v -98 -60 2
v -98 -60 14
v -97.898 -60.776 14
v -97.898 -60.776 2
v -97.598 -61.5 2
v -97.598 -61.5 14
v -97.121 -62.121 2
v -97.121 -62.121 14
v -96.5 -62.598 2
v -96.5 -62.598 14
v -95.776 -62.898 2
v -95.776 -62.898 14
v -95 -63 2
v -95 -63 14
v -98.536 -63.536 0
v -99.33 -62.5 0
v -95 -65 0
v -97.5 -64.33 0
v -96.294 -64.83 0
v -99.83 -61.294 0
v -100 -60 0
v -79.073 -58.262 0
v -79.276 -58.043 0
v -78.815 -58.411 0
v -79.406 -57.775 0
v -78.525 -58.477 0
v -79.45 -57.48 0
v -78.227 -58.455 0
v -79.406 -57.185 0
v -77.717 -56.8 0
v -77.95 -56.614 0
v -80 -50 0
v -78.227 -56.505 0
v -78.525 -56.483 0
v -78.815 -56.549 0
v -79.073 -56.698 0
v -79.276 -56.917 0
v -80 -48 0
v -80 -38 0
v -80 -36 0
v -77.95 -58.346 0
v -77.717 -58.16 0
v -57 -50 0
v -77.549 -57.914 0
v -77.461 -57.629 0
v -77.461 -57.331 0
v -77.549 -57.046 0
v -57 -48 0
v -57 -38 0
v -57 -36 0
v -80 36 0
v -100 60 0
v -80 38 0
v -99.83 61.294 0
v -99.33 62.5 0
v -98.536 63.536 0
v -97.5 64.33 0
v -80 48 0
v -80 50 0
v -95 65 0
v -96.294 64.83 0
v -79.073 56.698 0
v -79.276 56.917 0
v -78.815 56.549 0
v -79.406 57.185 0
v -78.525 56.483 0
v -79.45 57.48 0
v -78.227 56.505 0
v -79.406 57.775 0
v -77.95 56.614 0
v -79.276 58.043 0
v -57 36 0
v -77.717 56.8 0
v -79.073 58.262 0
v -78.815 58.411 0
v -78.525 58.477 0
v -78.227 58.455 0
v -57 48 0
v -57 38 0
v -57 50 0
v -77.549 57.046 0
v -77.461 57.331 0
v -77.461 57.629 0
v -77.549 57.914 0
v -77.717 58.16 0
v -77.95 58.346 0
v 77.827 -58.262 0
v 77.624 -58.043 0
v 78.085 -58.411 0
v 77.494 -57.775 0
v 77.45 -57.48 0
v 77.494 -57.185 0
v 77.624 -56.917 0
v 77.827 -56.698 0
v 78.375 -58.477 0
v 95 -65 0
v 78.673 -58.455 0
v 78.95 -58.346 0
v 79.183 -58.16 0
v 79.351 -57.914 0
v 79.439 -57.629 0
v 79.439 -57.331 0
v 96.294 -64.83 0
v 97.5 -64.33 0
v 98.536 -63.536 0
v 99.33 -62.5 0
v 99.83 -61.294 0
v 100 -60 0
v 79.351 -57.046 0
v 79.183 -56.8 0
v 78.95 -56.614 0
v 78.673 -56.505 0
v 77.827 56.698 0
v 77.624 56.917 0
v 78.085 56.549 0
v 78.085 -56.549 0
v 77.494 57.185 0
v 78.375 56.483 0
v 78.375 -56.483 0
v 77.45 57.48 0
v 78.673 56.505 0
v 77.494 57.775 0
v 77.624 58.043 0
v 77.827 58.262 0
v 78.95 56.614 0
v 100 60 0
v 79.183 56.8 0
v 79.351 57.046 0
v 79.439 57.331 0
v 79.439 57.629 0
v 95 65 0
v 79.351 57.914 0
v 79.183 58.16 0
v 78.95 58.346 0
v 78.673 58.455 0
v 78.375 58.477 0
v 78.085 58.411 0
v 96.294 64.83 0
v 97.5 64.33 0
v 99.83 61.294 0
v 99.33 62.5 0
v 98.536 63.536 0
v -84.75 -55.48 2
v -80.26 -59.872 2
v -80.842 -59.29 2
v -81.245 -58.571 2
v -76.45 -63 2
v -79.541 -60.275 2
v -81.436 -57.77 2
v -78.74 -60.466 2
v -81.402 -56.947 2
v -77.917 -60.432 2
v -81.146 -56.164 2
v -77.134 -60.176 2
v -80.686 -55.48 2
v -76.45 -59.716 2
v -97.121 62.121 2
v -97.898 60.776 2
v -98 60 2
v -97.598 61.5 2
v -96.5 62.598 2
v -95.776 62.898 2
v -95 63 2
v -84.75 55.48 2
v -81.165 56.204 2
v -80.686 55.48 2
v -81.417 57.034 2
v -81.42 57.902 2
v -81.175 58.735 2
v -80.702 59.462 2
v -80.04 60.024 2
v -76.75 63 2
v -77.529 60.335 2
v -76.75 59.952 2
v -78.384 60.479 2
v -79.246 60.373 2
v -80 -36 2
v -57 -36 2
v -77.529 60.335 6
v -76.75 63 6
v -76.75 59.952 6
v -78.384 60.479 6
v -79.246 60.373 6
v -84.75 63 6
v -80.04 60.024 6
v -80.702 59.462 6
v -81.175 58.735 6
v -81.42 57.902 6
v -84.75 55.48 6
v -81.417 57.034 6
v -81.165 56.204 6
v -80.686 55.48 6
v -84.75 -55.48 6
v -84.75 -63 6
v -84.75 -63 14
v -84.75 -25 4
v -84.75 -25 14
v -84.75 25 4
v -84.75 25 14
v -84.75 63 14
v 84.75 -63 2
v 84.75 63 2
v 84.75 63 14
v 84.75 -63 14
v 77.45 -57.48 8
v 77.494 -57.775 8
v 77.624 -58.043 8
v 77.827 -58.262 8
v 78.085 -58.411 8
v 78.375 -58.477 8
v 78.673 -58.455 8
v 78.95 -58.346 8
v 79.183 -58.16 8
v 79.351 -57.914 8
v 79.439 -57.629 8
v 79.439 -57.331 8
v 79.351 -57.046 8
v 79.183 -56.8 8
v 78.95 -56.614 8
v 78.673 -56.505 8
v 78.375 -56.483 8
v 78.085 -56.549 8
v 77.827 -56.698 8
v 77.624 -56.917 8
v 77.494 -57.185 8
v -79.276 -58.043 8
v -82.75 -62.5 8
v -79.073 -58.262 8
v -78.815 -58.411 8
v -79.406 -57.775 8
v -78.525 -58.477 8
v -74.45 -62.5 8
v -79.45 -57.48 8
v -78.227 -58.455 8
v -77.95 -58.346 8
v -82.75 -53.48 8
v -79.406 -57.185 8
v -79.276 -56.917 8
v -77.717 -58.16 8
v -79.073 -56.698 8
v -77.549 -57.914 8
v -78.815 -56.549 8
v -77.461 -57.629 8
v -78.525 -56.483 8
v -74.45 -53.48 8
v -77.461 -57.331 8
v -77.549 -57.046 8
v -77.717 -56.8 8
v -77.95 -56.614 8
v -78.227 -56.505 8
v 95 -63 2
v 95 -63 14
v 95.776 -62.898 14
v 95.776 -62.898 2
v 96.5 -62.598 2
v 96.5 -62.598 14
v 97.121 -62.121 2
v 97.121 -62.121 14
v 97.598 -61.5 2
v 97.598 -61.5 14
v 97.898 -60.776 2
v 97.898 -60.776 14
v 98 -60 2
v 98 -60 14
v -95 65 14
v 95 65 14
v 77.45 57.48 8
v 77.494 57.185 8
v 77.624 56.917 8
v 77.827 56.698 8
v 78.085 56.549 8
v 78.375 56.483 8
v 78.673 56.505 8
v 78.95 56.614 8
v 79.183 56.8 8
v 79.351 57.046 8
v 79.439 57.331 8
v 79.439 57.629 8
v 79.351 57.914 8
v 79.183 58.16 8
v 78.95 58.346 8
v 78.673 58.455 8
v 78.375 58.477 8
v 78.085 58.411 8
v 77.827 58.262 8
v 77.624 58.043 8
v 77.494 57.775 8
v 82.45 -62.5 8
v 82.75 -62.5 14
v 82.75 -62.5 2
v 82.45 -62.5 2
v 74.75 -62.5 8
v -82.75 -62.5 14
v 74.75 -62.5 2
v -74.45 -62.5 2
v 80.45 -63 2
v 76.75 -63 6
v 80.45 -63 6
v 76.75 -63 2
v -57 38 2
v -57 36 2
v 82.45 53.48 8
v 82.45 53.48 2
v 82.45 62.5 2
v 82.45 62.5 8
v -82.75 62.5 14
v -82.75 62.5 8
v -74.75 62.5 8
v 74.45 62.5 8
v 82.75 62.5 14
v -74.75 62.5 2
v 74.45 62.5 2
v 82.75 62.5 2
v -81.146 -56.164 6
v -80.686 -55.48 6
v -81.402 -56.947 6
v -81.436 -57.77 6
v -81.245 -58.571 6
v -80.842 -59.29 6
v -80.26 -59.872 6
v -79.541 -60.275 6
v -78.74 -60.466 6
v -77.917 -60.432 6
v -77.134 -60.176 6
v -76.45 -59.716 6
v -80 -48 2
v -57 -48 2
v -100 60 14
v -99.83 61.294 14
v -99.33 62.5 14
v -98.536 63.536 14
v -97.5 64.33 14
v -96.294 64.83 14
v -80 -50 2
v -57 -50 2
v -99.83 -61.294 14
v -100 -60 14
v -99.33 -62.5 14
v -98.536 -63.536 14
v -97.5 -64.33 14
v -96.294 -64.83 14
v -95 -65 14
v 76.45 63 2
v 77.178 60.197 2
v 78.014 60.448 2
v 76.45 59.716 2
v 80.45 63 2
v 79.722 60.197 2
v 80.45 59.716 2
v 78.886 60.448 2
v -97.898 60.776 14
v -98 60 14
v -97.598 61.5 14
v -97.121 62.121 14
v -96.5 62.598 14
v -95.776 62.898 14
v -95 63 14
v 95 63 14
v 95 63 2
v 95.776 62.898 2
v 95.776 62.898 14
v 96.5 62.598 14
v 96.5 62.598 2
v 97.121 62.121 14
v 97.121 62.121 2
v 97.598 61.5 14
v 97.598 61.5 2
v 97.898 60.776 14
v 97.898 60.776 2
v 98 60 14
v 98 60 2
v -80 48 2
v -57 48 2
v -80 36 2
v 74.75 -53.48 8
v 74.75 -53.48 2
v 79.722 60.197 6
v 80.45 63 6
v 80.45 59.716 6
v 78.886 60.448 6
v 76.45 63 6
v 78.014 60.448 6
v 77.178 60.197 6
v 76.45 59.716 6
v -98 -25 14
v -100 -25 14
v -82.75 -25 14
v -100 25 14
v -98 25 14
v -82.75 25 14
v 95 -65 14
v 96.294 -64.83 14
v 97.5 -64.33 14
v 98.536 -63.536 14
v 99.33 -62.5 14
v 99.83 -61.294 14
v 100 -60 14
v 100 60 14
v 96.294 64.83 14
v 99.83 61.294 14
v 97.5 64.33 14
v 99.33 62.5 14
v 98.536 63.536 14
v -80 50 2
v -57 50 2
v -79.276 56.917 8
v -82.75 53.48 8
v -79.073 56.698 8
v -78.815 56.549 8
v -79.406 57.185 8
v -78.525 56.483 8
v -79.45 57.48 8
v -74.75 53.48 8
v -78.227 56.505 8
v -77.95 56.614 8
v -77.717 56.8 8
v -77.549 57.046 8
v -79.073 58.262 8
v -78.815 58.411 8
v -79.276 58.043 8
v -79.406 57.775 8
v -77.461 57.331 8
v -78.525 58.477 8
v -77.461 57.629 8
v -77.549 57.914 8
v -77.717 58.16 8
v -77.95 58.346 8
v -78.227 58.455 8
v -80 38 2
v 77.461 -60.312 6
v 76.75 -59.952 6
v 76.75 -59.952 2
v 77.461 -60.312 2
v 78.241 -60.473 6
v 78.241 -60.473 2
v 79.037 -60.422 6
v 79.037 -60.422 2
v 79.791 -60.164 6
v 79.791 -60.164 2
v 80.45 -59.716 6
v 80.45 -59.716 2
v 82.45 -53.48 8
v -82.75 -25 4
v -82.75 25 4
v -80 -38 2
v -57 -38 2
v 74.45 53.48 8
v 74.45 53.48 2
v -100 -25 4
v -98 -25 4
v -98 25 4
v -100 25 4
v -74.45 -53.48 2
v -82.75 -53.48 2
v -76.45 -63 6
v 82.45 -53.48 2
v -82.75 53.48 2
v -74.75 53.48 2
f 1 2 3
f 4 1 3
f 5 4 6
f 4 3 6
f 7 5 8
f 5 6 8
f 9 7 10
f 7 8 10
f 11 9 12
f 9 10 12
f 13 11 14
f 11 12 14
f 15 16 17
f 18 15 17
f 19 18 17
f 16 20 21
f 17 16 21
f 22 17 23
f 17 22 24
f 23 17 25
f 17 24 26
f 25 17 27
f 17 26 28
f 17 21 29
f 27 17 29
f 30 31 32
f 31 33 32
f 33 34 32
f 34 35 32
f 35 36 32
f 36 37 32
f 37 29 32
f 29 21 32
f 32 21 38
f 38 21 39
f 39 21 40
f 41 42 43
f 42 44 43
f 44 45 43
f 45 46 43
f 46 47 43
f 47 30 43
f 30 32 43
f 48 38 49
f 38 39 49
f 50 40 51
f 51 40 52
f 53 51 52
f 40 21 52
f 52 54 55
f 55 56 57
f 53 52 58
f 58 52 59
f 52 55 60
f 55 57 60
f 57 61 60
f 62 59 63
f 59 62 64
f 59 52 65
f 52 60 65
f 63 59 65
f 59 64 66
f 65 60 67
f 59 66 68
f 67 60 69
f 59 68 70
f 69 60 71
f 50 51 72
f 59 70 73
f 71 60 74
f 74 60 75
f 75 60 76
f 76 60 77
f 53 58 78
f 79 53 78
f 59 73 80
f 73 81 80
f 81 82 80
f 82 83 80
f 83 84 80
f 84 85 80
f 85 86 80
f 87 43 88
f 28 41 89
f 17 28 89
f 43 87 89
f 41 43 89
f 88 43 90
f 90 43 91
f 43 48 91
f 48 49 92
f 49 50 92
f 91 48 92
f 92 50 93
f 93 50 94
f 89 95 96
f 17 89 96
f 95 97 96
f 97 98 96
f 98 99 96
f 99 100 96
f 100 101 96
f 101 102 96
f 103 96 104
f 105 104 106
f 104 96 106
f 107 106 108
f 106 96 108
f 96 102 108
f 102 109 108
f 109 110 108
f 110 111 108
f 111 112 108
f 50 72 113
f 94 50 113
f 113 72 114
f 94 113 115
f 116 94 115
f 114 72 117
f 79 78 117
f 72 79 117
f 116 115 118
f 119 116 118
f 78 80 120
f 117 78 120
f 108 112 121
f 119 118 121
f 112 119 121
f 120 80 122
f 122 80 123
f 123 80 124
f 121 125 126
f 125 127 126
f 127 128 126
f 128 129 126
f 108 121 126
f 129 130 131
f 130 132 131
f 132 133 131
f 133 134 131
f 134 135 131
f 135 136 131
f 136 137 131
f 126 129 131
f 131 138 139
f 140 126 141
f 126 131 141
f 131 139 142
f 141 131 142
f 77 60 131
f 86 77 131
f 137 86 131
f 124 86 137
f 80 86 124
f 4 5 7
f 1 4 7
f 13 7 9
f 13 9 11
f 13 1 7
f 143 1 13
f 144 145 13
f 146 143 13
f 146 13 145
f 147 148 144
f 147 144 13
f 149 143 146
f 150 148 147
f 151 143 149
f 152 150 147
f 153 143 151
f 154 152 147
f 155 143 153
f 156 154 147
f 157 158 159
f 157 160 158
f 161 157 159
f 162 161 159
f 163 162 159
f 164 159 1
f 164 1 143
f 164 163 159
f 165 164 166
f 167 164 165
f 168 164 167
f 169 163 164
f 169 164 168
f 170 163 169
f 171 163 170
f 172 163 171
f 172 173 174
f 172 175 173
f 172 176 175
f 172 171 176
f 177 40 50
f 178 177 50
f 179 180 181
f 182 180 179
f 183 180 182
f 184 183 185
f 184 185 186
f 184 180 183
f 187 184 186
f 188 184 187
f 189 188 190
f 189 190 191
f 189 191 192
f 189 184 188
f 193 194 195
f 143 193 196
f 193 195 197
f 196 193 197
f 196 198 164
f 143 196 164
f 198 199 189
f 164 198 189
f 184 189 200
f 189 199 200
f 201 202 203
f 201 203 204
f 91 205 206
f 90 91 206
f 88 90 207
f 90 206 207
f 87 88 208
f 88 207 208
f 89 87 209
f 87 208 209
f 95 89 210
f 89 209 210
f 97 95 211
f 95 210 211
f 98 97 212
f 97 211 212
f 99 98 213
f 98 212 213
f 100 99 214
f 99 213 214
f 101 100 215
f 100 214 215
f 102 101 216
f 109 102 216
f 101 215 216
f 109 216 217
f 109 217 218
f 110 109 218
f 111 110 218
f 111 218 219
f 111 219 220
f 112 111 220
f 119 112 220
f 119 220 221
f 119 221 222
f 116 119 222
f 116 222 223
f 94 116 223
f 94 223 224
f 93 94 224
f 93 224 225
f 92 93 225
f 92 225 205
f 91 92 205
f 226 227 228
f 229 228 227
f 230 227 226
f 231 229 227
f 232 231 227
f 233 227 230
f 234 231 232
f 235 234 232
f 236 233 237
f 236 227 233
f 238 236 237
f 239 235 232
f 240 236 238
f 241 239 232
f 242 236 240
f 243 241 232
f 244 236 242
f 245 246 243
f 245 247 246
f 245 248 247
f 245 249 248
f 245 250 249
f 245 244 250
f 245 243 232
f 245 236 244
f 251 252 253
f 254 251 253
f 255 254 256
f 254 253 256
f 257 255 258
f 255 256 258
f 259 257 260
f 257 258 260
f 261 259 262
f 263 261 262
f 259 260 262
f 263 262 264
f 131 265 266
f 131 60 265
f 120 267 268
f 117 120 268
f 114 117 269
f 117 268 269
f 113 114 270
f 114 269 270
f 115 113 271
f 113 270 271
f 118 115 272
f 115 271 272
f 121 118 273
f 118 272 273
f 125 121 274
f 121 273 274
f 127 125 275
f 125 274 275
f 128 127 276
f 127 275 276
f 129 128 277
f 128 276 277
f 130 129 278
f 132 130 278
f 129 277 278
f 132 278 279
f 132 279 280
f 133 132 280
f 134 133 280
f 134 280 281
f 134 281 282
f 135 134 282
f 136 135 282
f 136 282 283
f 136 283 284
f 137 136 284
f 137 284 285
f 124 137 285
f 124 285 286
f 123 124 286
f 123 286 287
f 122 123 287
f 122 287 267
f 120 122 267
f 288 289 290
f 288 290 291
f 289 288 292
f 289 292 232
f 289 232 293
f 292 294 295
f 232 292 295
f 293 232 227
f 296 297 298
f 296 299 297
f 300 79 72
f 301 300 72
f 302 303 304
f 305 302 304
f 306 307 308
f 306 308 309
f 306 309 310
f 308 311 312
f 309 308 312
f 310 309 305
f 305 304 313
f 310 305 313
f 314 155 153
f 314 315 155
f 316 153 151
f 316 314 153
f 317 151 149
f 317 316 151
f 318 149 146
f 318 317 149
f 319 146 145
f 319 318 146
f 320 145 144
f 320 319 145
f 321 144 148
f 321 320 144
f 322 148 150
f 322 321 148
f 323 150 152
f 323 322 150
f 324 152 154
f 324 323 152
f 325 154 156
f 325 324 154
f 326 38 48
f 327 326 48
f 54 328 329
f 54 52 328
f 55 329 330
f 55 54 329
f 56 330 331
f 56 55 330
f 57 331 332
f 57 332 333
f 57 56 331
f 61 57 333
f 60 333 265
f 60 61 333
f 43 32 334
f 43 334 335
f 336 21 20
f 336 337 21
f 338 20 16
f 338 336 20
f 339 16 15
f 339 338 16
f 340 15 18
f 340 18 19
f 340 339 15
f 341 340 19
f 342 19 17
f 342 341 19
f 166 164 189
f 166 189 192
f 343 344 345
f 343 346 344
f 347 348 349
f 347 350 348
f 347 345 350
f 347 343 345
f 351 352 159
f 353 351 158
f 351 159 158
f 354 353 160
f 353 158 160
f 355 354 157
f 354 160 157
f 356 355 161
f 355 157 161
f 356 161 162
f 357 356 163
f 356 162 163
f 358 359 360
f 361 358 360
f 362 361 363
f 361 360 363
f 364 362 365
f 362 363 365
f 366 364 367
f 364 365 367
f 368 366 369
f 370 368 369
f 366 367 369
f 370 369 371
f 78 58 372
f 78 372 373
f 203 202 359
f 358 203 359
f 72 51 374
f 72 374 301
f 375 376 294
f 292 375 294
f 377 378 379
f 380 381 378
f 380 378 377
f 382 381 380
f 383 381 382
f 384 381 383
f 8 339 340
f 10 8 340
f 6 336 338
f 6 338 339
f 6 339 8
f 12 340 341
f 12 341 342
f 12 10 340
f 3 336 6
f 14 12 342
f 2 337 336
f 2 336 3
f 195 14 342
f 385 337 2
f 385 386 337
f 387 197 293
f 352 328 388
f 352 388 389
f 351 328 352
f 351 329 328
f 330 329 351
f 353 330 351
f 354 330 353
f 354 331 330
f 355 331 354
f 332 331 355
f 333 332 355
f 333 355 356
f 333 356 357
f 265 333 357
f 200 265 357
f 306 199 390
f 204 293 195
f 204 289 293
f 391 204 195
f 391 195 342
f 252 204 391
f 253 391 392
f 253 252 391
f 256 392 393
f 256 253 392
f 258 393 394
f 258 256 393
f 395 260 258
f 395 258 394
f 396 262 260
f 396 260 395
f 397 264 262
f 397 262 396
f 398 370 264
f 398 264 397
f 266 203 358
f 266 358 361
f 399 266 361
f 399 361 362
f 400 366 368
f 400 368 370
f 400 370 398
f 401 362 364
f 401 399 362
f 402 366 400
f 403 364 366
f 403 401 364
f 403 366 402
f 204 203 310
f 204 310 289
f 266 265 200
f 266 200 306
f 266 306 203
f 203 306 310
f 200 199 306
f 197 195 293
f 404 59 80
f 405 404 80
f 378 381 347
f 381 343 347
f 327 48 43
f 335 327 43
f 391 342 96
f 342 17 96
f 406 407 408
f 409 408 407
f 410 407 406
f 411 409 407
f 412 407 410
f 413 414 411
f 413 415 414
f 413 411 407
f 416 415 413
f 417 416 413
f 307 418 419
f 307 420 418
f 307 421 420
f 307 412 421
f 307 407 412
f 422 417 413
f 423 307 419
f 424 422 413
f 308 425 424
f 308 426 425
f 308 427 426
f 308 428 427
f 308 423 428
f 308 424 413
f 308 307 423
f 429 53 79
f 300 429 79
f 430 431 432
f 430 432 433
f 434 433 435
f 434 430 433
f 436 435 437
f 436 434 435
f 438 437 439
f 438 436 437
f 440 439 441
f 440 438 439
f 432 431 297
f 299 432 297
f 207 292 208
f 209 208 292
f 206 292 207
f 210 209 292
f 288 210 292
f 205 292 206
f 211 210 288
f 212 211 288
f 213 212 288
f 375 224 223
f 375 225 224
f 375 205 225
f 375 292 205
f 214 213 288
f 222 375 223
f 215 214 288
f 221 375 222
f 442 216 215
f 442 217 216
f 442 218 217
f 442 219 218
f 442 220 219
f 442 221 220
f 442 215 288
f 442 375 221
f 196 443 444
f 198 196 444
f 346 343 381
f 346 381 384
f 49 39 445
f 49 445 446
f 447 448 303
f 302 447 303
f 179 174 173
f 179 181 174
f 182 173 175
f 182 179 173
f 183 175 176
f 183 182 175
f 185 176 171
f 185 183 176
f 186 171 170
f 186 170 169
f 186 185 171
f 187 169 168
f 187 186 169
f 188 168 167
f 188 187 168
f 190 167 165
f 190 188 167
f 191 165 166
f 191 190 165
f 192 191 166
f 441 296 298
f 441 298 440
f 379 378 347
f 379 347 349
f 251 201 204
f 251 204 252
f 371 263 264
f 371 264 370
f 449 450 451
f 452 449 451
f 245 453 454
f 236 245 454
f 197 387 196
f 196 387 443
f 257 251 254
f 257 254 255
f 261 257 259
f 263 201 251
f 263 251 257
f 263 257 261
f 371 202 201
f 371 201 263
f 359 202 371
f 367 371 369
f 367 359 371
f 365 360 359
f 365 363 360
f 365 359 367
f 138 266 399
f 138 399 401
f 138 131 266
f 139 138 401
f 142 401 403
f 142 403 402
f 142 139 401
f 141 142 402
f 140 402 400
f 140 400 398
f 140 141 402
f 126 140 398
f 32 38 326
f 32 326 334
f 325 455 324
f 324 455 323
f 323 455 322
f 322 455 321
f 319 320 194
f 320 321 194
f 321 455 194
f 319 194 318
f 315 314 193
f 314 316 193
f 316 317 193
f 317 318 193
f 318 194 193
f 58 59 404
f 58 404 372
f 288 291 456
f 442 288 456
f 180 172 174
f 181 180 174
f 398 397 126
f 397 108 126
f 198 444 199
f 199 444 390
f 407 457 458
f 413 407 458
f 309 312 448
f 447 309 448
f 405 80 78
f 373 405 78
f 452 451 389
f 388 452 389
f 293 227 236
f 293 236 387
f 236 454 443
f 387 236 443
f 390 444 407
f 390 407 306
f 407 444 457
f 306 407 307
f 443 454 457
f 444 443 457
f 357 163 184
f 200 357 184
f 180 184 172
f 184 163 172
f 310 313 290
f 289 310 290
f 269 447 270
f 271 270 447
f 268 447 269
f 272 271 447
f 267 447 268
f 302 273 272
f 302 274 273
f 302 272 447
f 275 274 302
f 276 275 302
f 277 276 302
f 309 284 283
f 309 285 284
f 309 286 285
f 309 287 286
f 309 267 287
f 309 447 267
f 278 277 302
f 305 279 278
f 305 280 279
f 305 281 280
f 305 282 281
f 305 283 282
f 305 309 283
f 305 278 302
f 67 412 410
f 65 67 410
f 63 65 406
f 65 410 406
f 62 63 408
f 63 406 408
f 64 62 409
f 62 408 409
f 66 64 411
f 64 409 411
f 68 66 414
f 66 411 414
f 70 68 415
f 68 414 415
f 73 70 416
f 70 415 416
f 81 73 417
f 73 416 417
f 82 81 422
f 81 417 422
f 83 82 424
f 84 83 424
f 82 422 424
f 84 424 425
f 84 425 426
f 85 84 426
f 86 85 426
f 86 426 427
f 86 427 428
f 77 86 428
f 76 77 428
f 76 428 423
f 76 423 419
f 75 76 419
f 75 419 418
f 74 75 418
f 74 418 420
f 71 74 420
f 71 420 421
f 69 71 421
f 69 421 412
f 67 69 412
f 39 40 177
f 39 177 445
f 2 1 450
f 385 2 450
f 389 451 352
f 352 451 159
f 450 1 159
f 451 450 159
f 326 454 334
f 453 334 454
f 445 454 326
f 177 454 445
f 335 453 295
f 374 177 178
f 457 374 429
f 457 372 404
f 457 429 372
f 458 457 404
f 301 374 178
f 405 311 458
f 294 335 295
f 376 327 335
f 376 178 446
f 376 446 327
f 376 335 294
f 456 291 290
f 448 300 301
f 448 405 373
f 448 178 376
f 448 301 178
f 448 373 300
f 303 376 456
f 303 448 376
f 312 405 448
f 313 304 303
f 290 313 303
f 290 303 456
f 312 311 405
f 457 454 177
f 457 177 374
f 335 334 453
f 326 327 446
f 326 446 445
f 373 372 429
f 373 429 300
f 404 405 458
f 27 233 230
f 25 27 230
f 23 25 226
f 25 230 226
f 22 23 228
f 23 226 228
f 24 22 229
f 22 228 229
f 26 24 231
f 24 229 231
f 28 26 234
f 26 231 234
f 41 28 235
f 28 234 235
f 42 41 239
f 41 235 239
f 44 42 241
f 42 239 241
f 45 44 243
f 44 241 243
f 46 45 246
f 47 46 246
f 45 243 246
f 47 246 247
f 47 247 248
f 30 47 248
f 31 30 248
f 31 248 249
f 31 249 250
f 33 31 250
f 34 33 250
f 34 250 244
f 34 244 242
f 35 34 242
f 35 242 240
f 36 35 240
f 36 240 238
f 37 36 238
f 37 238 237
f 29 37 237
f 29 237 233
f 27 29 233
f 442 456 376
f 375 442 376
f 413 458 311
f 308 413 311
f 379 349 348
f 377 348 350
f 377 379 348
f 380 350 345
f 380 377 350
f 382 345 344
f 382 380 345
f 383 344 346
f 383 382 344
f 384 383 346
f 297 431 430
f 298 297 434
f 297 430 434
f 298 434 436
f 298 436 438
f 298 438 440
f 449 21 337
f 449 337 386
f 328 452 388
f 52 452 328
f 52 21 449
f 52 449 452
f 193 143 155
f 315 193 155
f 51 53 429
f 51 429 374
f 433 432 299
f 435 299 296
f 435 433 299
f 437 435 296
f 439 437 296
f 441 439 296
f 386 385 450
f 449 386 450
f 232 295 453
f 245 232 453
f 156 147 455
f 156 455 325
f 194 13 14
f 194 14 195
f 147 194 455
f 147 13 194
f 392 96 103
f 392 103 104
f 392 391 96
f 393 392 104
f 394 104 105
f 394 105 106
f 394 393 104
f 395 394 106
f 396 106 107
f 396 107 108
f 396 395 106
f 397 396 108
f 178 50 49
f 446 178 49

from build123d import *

# Parameters (mm, degrees)
F0_W         = 200
F0_H         = 130
F0_W_2       = 0.3
F0_H_2       = 106.96
F1_DEPTH     = 2
F2_DEPTH     = 14
F3_DEPTH     = 8
F4_D         = 2
F5_R         = 5
F6_T         = 2
F6_T3_DEPTH  = 16
F6_T5_DEPTH  = 10
F6_T7_DEPTH  = 12
F6_T9_DEPTH  = 10
F6_T11_DEPTH = 153.2
F6_T13_DEPTH = 12
F6_T15_DEPTH = 4.3
F6_T17_DEPTH = 129
F6_T19_DEPTH = 12.3
F6_T21_DEPTH = 11.7
F6_T23_DEPTH = 153.2
F6_T25_DEPTH = 13.02
F6_T27_DEPTH = 13.02
F6_T29_DEPTH = 110.96
F7_W         = 23
F7_H         = 2
F8_DEPTH     = 22.5
F9_W         = 50
F9_H         = 8
F9_H_2       = 2
F10_DEPTH    = 25


# Not quite as in the source:
# - a shell that OpenCascade refuses in one call is made with other operations: the cavity is built on its own and cut out


with BuildPart() as f1:
    # F0 (on Top) → F1 (new body)
    with BuildSketch(Plane.XY):
        Rectangle(F0_W, F0_H)
        Polygon((77.15, 62.5), (79.15, 62.5), (82.45, 62.5), (82.75, 62.5), (82.75, 59.5), (82.75, -58.77), (82.75, -62.5), (82.45, -62.5), (79.45, -62.5), (77.45, -62.5), (74.75, -62.5), (-74.45, -62.5), (-77.45, -62.5), (-79.45, -62.5), (-82.75, -62.5), (-82.75, -58.77), (-82.75, -53.48), (-82.75, 53.48), (-82.75, 59.5), (-82.75, 62.5), (-79.75, 62.5), (-77.75, 62.5), (-74.75, 62.5), (74.45, 62.5), align=None, mode=Mode.SUBTRACT)
        Polygon((74.45, 53.48), (74.45, 62.5), (-74.75, 62.5), (-74.75, 53.48), (-82.45, 53.48), (-82.45, -53.48), (-74.45, -53.48), (-74.45, -62.5), (74.75, -62.5), (74.75, -53.48), (82.45, -53.48), (82.45, 53.48), align=None)
        Polygon((-74.75, 53.48), (-74.75, 62.5), (-77.75, 62.5), (-79.75, 62.5), (-82.75, 62.5), (-82.75, 59.5), (-82.75, 53.48), (-82.45, 53.48), align=None)
        Polygon((82.45, 62.5), (79.15, 62.5), (77.15, 62.5), (74.45, 62.5), (74.45, 53.48), (82.45, 53.48), align=None)
        Polygon((82.45, -62.5), (82.45, -53.48), (74.75, -53.48), (74.75, -62.5), (77.45, -62.5), (79.45, -62.5), align=None)
        Polygon((-74.45, -53.48), (-82.45, -53.48), (-82.75, -53.48), (-82.75, -58.77), (-82.75, -62.5), (-79.45, -62.5), (-77.45, -62.5), (-74.45, -62.5), align=None)
        with Locations((-82.6, 0)):
            Rectangle(F0_W_2, F0_H_2)
        Polygon((82.75, 62.5), (82.45, 62.5), (82.45, 53.48), (82.45, -53.48), (82.45, -62.5), (82.75, -62.5), (82.75, -58.77), (82.75, 59.5), align=None)
    extrude(amount=F1_DEPTH)

    # F0 (on Top) → F2 (join)
    with BuildSketch(Plane.XY):
        Rectangle(F0_W, F0_H)
        Polygon((77.15, 62.5), (79.15, 62.5), (82.45, 62.5), (82.75, 62.5), (82.75, 59.5), (82.75, -58.77), (82.75, -62.5), (82.45, -62.5), (79.45, -62.5), (77.45, -62.5), (74.75, -62.5), (-74.45, -62.5), (-77.45, -62.5), (-79.45, -62.5), (-82.75, -62.5), (-82.75, -58.77), (-82.75, -53.48), (-82.75, 53.48), (-82.75, 59.5), (-82.75, 62.5), (-79.75, 62.5), (-77.75, 62.5), (-74.75, 62.5), (74.45, 62.5), align=None, mode=Mode.SUBTRACT)
    extrude(amount=F2_DEPTH)

    # F0 (on Top) → F3 (join)
    with BuildSketch(Plane.XY):
        Polygon((-74.45, -53.48), (-82.45, -53.48), (-82.75, -53.48), (-82.75, -58.77), (-82.75, -62.5), (-79.45, -62.5), (-77.45, -62.5), (-74.45, -62.5), align=None)
        Polygon((-74.75, 53.48), (-74.75, 62.5), (-77.75, 62.5), (-79.75, 62.5), (-82.75, 62.5), (-82.75, 59.5), (-82.75, 53.48), (-82.45, 53.48), align=None)
        Polygon((82.45, -62.5), (82.45, -53.48), (74.75, -53.48), (74.75, -62.5), (77.45, -62.5), (79.45, -62.5), align=None)
        Polygon((82.45, 62.5), (79.15, 62.5), (77.15, 62.5), (74.45, 62.5), (74.45, 53.48), (82.45, 53.48), align=None)
    extrude(amount=F3_DEPTH)

    # F4 (through all)
    with Locations(Plane(origin=(0, 0, 0), x_dir=(1, 0, 0), z_dir=(0, 0, -1))):
        with Locations((-78.45, 57.48), (78.45, 57.48), (-78.45, -57.48), (78.45, -57.48)):
            Hole(F4_D / 2)

    # F5
    f5_edges = [f1.edges().sort_by_distance(p)[0] for p in [
        (-100, -65, 7),
        (-100, 65, 7),
        (100, 65, 7),
        (100, -65, 7),
    ]]
    fillet(f5_edges, radius=F5_R)

    # F6: shell of thickness 2, made by hand


with BuildPart() as f6_core1:
    # F6_t2: copy of F1
    add(f1.part)

    # the walls: a layer under each face that stays
    f6_faces = [f6_core1.faces().sort_by_distance(p)[0] for p in [
        (100, 0, 7),
        (98.5355339059, -63.5355339059, 7),
        (98.5355339059, 63.5355339059, 7),
        (0, 0, 0),
        (0, -65, 7),
        (0, 65, 7),
        (-98.5355339059, -63.5355339059, 7),
        (-98.5355339059, 63.5355339059, 7),
        (-100, 0, 7),
        (0, 62.5, 8),
        (82.75, 0, 8),
        (0, -62.5, 8),
        (-82.75, 0, 8),
        (-79.45, -57.48, 4),
        (77.45, -57.48, 4),
        (-79.45, 57.48, 4),
        (77.45, 57.48, 4),
        (-81.4166666667, 54.9833333333, 8),
        (-74.75, 57.99, 5),
        (0, 0, 2),
        (74.45, 57.99, 5),
        (75.7833333333, 54.9833333333, 8),
        (82.45, 57.99, 5),
        (-74.45, -57.99, 5),
        (-81.3666666667, -60.9966666667, 8),
        (82.45, -57.99, 5),
        (76.0333333333, -60.9966666667, 8),
        (74.75, -57.99, 5),
        (-78.75, 53.48, 5),
        (-78.6, -53.48, 5),
        (78.6, -53.48, 5),
        (78.45, 53.48, 5),
    ]]
    thicken(f6_faces, amount=-F6_T, mode=Mode.SUBTRACT)

    # F6_s4 → F6_t3 (cut)
    with BuildSketch(Plane.XY):
        Polygon((82.73, 62.48), (82.75, 64.5), (84.75, 64.5), (84.75, 62.5), align=None)
        Polygon((82.73, -62.48), (84.75, -62.5), (84.75, -64.5), (82.75, -64.5), align=None)
    extrude(amount=F6_T3_DEPTH, mode=Mode.SUBTRACT)

    # F6_s6 → F6_t5 (cut)
    with BuildSketch(Plane.XY.offset(6)):
        Polygon((-82.73, 62.48), (-82.75, 64.5), (-84.75, 64.5), (-84.75, 62.5), align=None)
        Polygon((-82.73, -62.48), (-82.75, -64.5), (-84.75, -64.5), (-84.75, -62.5), align=None)
    extrude(amount=F6_T5_DEPTH, mode=Mode.SUBTRACT)

    # F6_s8 → F6_t7 (cut)
    with BuildSketch(Plane.YZ.offset(-84.75)):
        Polygon((62.48, 8.02), (64.5, 8), (64.5, 6), (62.5, 6), align=None)
        Polygon((53.46, 2.02), (53.48, 0), (55.48, 0), (55.48, 2), align=None)
    extrude(amount=F6_T7_DEPTH, mode=Mode.SUBTRACT)

    # F6_s10 → F6_t9 (cut)
    with BuildSketch(Plane.XY):
        Polygon((-74.73, 62.48), (-74.75, 64.5), (-76.75, 64.5), (-76.75, 62.5), align=None)
        Polygon((74.43, 62.48), (74.45, 64.5), (76.45, 64.5), (76.45, 62.5), align=None)
        Polygon((82.47, 62.48), (82.45, 64.5), (80.45, 64.5), (80.45, 62.5), align=None)
        Polygon((-74.43, -62.48), (-74.45, -64.5), (-76.45, -64.5), (-76.45, -62.5), align=None)
        Polygon((82.47, -62.48), (82.45, -64.5), (80.45, -64.5), (80.45, -62.5), align=None)
        Polygon((74.73, -62.48), (74.75, -64.5), (76.75, -64.5), (76.75, -62.5), align=None)
        Polygon((-82.73, 53.46), (-84.75, 53.48), (-84.75, 55.48), (-82.75, 55.48), align=None)
        Polygon((-82.73, -53.46), (-84.75, -53.48), (-84.75, -55.48), (-82.75, -55.48), align=None)
    extrude(amount=F6_T9_DEPTH, mode=Mode.SUBTRACT)

    # F6_s12 → F6_t11 (cut)
    with BuildSketch(Plane.YZ.offset(-76.75)):
        Polygon((62.48, 2.02), (64.5, 2), (64.5, 0), (62.5, 0), align=None)
    extrude(amount=F6_T11_DEPTH, mode=Mode.SUBTRACT)

    # F6_s14 → F6_t13 (cut)
    with BuildSketch(Plane.YZ.offset(72.45)):
        Polygon((62.48, 8.02), (64.5, 8), (64.5, 6), (62.5, 6), align=None)
        Polygon((53.46, 2.02), (53.48, 0), (55.48, 0), (55.48, 2), align=None)
    extrude(amount=F6_T13_DEPTH, mode=Mode.SUBTRACT)

    # F6_s16 → F6_t15 (cut)
    with BuildSketch(Plane.YZ.offset(80.45)):
        Polygon((62.48, 2.02), (64.5, 2), (64.5, 0), (62.5, 0), align=None)
        Polygon((-62.48, 2.02), (-64.5, 2), (-64.5, 0), (-62.5, 0), align=None)
    extrude(amount=F6_T15_DEPTH, mode=Mode.SUBTRACT)

    # F6_s18 → F6_t17 (cut)
    with BuildSketch(Plane.XZ.offset(-64.5)):
        Polygon((82.73, 2.02), (84.75, 2), (84.75, 0), (82.75, 0), align=None)
    extrude(amount=F6_T17_DEPTH, mode=Mode.SUBTRACT)

    # F6_s20 → F6_t19 (cut)
    with BuildSketch(Plane.YZ.offset(-84.75)):
        Polygon((-62.48, 8.02), (-64.5, 8), (-64.5, 6), (-62.5, 6), align=None)
        Polygon((-53.46, 2.02), (-53.48, 0), (-55.48, 0), (-55.48, 2), align=None)
    extrude(amount=F6_T19_DEPTH, mode=Mode.SUBTRACT)

    # F6_s22 → F6_t21 (cut)
    with BuildSketch(Plane.YZ.offset(72.75)):
        Polygon((-62.48, 8.02), (-64.5, 8), (-64.5, 6), (-62.5, 6), align=None)
        Polygon((-53.46, 2.02), (-53.48, 0), (-55.48, 0), (-55.48, 2), align=None)
    extrude(amount=F6_T21_DEPTH, mode=Mode.SUBTRACT)

    # F6_s24 → F6_t23 (cut)
    with BuildSketch(Plane.YZ.offset(-76.45)):
        Polygon((-62.48, 2.02), (-64.5, 2), (-64.5, 0), (-62.5, 0), align=None)
    extrude(amount=F6_T23_DEPTH, mode=Mode.SUBTRACT)

    # F6_s26 → F6_t25 (cut)
    with BuildSketch(Plane.XZ.offset(-64.5)):
        Polygon((-82.73, 8.02), (-84.75, 8), (-84.75, 6), (-82.75, 6), align=None)
        Polygon((-74.73, 2.02), (-76.75, 2), (-76.75, 0), (-74.75, 0), align=None)
        Polygon((74.43, 2.02), (74.45, 0), (76.45, 0), (76.45, 2), align=None)
        Polygon((82.47, 2.02), (82.45, 0), (80.45, 0), (80.45, 2), align=None)
    extrude(amount=F6_T25_DEPTH, mode=Mode.SUBTRACT)

    # F6_s28 → F6_t27 (cut)
    with BuildSketch(Plane.XZ.offset(51.48)):
        Polygon((-82.73, 8.02), (-84.75, 8), (-84.75, 6), (-82.75, 6), align=None)
        Polygon((82.47, 2.02), (82.45, 0), (80.45, 0), (80.45, 2), align=None)
        Polygon((74.73, 2.02), (74.75, 0), (76.75, 0), (76.75, 2), align=None)
        Polygon((-74.43, 2.02), (-74.45, 0), (-76.45, 0), (-76.45, 2), align=None)
    extrude(amount=F6_T27_DEPTH, mode=Mode.SUBTRACT)

    # F6_s30 → F6_t29 (cut)
    with BuildSketch(Plane.XZ.offset(-55.48)):
        Polygon((-82.73, 2.02), (-84.75, 2), (-84.75, 0), (-82.75, 0), align=None)
    extrude(amount=F6_T29_DEPTH, mode=Mode.SUBTRACT)


with BuildPart() as f1_1:
    add(f1.part)

    # what is left inside the walls is the cavity
    f6_cavity = [f6_core1.part.solids().sort_by_distance(p)[0] for p in [
        (91.375, -21, 13.98),
        (-87.225, -21, 2.02),
        (78.642053, -60.493887, 4.666667),
        (78.45, 60.5, 4.666667),
    ]]
    add(f6_cavity, mode=Mode.SUBTRACT)

    # F7 (on face) → F8 (cut)
    with BuildSketch(Plane(origin=(0, 0, 0), x_dir=(1, 0, 0), z_dir=(0, 0, -1))):
        with Locations((-68.5, 49)):
            Rectangle(F7_W, F7_H)
        with Locations((-68.5, 37)):
            Rectangle(F7_W, F7_H)
        with Locations((-68.5, -37)):
            Rectangle(F7_W, F7_H)
        with Locations((-68.5, -49)):
            Rectangle(F7_W, F7_H)
    extrude(amount=-F8_DEPTH, mode=Mode.SUBTRACT)

    # F9 (on face) → F10 (cut)
    with BuildSketch(Plane.YZ.offset(-82.75)):
        with Locations((0, 8)):
            Rectangle(F9_W, F9_H)
        with Locations((0, 13)):
            Rectangle(F9_W, F9_H_2)
    extrude(amount=-F10_DEPTH, mode=Mode.SUBTRACT)


solid = f1_1.part
